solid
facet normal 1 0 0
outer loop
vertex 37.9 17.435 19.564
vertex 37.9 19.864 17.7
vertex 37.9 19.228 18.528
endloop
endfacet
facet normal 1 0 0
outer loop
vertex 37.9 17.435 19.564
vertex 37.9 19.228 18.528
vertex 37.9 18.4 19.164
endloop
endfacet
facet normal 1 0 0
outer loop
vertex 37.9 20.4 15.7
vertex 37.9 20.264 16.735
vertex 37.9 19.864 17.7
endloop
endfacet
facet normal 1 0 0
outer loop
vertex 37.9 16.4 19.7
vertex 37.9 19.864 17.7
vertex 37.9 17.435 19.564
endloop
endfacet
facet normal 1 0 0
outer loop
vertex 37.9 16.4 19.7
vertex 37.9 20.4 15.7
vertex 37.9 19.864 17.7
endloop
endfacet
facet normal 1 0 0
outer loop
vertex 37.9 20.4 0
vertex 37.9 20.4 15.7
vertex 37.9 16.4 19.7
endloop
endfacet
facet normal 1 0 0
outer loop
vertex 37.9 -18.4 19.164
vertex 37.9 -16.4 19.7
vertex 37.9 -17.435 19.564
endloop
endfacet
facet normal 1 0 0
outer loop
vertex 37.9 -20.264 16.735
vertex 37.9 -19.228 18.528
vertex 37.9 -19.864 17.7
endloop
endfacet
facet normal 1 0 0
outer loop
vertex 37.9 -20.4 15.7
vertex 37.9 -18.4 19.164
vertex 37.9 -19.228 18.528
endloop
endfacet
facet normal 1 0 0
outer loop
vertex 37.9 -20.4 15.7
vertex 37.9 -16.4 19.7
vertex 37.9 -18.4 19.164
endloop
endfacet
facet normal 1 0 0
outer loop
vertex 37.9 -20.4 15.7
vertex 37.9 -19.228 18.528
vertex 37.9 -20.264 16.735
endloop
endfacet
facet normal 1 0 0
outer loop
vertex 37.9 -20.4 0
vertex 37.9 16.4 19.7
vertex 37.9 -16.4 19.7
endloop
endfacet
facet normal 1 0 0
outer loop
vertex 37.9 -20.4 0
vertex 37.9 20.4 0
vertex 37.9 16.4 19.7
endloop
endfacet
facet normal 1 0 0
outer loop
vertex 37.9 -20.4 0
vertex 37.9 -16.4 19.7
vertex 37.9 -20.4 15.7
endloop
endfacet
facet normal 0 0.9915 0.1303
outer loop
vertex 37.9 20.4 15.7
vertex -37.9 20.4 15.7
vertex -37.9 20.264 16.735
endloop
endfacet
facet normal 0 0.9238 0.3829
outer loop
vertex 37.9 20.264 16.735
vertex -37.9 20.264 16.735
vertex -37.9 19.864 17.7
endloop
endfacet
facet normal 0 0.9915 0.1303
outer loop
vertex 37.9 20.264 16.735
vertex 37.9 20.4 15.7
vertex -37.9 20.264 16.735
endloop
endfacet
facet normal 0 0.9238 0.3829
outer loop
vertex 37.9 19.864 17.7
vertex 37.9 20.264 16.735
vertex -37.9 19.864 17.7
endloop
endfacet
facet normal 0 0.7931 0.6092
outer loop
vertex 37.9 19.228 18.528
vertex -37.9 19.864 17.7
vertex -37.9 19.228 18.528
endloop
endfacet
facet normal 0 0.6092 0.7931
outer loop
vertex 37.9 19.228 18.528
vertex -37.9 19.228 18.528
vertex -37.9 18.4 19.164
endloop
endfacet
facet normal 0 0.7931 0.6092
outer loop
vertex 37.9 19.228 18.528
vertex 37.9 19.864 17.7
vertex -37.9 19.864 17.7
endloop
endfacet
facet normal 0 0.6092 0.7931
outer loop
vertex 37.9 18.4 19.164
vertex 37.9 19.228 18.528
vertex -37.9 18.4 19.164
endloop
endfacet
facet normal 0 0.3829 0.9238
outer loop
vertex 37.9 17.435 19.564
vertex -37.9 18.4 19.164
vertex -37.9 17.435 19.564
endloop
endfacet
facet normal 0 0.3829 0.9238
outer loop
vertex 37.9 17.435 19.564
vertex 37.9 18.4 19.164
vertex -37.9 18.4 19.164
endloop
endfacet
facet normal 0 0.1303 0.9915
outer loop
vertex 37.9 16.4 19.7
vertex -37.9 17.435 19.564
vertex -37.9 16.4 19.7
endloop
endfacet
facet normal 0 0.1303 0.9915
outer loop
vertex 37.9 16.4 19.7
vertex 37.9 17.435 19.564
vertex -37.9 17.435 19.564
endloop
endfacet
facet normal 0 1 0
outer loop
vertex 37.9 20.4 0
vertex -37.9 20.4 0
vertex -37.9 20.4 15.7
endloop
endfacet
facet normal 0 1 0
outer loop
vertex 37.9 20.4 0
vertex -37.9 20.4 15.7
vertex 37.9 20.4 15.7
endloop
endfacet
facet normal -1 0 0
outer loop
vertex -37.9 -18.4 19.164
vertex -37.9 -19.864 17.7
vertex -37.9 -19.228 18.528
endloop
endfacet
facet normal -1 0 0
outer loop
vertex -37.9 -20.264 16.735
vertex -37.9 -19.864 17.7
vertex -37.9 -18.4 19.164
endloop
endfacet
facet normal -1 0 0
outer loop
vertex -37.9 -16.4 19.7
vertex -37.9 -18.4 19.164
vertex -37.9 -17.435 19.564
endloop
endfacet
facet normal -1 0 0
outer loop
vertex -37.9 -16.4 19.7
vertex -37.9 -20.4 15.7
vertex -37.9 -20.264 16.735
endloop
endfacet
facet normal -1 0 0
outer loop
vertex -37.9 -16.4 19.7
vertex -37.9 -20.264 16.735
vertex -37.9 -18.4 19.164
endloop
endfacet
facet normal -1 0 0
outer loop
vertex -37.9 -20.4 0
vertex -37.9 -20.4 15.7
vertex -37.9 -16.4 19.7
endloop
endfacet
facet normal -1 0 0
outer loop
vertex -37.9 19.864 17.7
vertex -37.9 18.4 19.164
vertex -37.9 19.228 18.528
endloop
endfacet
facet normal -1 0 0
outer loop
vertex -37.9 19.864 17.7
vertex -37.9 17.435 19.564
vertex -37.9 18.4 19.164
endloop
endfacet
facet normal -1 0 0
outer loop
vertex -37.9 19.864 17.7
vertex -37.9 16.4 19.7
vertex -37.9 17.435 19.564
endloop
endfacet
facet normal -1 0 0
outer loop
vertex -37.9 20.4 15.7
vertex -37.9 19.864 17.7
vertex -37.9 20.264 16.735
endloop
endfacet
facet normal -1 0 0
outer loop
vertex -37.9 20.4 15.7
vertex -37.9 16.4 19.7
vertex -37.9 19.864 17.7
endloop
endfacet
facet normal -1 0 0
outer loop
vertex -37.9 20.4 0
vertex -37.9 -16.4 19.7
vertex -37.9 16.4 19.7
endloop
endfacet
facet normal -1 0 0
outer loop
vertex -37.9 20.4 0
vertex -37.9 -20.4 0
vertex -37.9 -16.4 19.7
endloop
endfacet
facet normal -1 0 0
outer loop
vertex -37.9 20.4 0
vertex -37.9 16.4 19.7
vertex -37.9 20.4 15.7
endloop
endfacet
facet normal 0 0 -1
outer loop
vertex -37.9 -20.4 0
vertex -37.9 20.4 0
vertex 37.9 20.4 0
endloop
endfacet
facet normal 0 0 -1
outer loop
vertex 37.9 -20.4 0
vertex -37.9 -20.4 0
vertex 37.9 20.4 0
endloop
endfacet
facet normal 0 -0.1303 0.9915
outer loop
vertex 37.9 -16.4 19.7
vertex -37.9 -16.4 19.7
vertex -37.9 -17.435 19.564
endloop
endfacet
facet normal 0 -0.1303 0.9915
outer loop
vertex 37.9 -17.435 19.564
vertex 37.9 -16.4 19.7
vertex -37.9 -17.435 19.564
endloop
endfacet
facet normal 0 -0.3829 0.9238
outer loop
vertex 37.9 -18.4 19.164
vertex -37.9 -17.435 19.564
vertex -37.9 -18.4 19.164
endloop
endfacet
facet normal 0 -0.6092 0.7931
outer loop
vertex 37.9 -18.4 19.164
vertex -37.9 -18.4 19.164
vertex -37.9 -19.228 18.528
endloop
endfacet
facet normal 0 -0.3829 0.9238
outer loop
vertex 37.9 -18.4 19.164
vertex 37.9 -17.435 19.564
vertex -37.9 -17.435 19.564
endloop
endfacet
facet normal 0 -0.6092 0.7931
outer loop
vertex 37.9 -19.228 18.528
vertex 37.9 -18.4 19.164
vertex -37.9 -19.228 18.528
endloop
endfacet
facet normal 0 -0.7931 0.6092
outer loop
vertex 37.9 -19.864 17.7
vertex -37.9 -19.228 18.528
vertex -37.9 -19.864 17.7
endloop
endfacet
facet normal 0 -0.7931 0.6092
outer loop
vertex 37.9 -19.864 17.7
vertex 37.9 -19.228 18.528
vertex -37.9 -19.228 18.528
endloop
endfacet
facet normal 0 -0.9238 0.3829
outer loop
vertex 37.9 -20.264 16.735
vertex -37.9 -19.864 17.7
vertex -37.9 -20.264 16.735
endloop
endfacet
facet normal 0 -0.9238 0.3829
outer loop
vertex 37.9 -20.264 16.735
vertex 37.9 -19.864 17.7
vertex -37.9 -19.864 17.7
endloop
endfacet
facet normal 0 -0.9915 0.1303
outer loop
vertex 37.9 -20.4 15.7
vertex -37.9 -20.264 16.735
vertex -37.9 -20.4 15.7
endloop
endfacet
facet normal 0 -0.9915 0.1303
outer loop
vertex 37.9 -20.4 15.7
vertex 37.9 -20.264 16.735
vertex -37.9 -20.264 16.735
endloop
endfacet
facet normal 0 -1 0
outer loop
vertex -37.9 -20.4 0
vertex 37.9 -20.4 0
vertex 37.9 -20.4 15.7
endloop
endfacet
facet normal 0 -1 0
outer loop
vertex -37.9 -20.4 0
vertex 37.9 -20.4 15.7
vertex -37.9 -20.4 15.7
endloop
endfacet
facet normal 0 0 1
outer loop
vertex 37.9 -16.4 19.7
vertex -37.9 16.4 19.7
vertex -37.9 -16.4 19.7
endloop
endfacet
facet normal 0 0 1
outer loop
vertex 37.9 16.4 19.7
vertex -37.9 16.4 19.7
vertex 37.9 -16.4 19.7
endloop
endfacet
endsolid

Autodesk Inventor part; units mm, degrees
ref_plane "YZ Plane" through (0, 0, 0) normal (1, 0, 0) x (0, 1, 0)
ref_plane "XZ Plane" through (0, 0, 0) normal (0, 1, 0) x (-1, 0, 0)
ref_plane "XY Plane" through (0, 0, 0) normal (0, 0, 1) x (1, 0, 0)
sketch "Náčrt1" plane through (0, 0, 0) normal (0, 0, 1) x (1, 0, 0)
  line L0 (0, 28.56) -> (0, -28.56) projected
  line L1 (-53.06, 0) -> (53.06, 0) projected
  line L2 (-37.9, 20.4) -> (37.9, 20.4)
  line L3 (37.9, 20.4) -> (37.9, -20.4)
  line L4 (37.9, -20.4) -> (-37.9, -20.4)
  line L5 (-37.9, -20.4) -> (-37.9, 20.4)
  point P0 (0, 0)
  dimension "d0" = 75.8
  dimension "d1" = 40.8
extrude "Vysunutí1" add sketch "Náčrt1" along normal blind 19.7
fillet "Zaoblení1" radius 4 2 edges at (0, 20.4, 19.7) (0, -20.4, 19.7)
properties part number "prop_battery"
